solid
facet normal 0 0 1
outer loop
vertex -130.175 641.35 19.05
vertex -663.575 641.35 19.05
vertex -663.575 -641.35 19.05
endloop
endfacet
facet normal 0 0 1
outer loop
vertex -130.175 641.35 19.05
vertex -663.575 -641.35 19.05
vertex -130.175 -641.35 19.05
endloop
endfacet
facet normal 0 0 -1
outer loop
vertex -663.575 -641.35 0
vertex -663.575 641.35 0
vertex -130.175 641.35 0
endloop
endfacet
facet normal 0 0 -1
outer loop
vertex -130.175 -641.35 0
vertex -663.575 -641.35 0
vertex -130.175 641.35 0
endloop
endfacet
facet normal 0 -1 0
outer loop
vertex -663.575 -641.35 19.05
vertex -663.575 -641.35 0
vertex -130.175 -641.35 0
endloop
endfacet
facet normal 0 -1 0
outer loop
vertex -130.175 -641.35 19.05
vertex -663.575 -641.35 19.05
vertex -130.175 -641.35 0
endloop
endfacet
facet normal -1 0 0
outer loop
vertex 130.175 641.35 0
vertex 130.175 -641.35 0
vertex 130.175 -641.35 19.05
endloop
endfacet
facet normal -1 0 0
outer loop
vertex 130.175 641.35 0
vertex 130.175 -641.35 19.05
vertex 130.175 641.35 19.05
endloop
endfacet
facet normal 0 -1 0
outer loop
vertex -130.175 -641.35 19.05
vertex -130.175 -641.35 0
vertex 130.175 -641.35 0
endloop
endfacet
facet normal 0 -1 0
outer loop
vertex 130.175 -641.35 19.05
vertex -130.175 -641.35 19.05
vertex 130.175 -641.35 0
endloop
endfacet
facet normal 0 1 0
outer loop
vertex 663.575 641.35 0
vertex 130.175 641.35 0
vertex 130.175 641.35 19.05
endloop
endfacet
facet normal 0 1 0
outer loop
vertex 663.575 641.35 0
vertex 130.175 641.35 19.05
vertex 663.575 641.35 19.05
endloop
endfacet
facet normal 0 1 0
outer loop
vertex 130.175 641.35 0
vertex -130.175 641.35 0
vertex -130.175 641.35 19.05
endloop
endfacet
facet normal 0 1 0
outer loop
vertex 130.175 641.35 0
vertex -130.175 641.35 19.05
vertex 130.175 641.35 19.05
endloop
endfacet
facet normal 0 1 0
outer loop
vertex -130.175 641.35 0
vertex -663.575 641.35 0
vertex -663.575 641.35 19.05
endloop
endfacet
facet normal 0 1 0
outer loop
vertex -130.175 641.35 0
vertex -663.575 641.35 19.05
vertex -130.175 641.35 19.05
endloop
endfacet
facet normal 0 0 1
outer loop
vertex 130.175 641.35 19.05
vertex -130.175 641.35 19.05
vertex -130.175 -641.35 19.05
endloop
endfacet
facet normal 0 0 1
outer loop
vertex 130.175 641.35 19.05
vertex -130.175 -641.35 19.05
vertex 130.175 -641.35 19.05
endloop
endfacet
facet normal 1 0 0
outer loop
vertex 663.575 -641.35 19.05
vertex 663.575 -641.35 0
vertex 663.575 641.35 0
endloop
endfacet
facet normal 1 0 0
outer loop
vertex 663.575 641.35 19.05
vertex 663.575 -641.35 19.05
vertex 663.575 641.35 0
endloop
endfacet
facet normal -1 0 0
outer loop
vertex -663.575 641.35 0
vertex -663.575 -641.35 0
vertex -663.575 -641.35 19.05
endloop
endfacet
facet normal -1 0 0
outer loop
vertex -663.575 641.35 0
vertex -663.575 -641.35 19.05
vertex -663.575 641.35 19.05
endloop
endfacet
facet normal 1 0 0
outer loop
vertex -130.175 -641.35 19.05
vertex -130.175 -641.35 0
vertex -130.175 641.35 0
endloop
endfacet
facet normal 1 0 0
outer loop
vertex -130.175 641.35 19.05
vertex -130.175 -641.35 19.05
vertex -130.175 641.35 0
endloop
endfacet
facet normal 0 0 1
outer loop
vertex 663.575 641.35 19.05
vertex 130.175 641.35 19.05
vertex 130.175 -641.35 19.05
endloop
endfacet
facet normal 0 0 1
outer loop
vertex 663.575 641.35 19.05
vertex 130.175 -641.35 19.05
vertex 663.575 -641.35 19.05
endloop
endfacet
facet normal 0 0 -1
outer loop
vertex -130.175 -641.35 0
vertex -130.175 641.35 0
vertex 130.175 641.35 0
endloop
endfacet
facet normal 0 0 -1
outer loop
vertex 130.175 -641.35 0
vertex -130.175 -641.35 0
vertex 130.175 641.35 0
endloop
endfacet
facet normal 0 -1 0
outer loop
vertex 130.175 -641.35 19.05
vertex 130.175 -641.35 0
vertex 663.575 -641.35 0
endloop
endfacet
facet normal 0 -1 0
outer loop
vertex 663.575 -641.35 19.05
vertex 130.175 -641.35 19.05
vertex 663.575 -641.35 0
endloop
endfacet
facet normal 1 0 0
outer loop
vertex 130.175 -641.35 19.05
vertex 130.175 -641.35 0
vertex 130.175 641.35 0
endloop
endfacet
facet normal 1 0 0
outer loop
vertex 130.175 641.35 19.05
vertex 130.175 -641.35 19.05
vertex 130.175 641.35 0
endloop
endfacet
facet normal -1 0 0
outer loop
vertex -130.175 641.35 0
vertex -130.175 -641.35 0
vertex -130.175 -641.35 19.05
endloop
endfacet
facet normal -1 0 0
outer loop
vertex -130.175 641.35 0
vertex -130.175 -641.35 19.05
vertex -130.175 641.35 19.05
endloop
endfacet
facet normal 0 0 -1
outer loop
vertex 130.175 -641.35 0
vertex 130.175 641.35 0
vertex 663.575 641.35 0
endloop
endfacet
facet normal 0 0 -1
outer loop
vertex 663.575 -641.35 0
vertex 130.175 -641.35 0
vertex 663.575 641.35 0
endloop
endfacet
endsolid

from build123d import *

# Parameters (mm, degrees)
F0_W     = 533.4
F0_H     = 1282.7
F1_DEPTH = 19.05
F2_DEPTH = 19.05
F0_W_2   = 260.35
F3_DEPTH = 19.05


with BuildPart() as f1:
    # F0 (on Top) → F1 (new body)
    with BuildSketch(Plane.XY):
        with Locations((-396.875, 0)):
            Rectangle(F0_W, F0_H)
    extrude(amount=F1_DEPTH)


with BuildPart() as f2:
    # F0 (on Top) → F2 (new body)
    with BuildSketch(Plane.XY):
        with Locations((396.875, 0)):
            Rectangle(F0_W, F0_H)
    extrude(amount=F2_DEPTH)


with BuildPart() as f3:
    # F0 (on Top) → F3 (new body)
    with BuildSketch(Plane.XY):
        Rectangle(F0_W_2, F0_H)
    extrude(amount=F3_DEPTH)


solid = Compound([f1.part, f2.part, f3.part])
